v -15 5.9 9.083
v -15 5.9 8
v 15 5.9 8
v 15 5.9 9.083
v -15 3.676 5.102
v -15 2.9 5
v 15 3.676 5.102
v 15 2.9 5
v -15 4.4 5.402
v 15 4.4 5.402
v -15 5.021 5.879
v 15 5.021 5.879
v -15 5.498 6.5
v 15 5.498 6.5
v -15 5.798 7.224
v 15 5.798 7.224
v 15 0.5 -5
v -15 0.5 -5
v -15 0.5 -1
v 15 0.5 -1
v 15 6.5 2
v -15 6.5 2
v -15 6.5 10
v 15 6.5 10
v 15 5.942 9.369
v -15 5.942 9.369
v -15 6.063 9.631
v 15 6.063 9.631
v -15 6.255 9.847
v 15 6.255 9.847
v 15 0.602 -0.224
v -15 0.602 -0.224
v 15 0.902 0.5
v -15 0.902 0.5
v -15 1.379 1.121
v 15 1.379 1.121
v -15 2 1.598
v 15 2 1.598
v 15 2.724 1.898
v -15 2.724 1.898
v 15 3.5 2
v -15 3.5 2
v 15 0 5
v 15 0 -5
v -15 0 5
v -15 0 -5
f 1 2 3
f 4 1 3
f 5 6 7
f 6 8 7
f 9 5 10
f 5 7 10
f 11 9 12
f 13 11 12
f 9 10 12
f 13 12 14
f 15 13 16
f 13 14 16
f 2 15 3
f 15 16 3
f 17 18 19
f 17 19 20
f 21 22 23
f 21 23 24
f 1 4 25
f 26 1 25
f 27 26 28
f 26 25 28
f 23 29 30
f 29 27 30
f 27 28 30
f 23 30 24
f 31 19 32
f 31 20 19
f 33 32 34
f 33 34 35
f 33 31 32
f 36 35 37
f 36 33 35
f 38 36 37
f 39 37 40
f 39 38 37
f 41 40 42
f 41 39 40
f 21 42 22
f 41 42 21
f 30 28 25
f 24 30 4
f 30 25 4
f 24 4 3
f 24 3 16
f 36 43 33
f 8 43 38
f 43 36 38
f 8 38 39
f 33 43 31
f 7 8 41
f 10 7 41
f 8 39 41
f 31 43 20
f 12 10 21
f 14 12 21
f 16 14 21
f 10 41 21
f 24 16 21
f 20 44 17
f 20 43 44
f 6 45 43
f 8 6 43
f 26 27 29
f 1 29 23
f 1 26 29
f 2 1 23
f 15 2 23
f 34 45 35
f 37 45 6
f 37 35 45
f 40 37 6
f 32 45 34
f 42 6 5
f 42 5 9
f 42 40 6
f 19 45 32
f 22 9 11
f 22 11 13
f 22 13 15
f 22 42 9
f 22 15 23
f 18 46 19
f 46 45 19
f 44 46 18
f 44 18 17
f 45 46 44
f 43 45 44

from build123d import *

# Parameters (mm, degrees)
SKETCH1_W           = 30
SKETCH1_H           = 10
BOSS_EXTRUDE1_DEPTH = 0.5
SKETCH2_W           = 30
SKETCH2_H           = 3
BOSS_EXTRUDE2_DEPTH = 6
SKETCH3_W           = 30
SKETCH3_H           = 0.6
BOSS_EXTRUDE3_DEPTH = 5
FILLET1_R           = 3
FILLET2_R           = 1


with BuildPart() as part:
    # Sketch1 → Boss-Extrude1 (new body)
    with BuildSketch(Plane(origin=(0, 0, 0), x_dir=(1, 0, 0), z_dir=(0, 1, 0))):
        Rectangle(SKETCH1_W, SKETCH1_H)
    extrude(amount=BOSS_EXTRUDE1_DEPTH)

    # Sketch2 → Boss-Extrude2 (add)
    with BuildSketch(Plane(origin=(0, 0.5, 0), x_dir=(1, 0, 0), z_dir=(0, 1, 0))):
        with Locations((0, -3.5)):
            Rectangle(SKETCH2_W, SKETCH2_H)
    extrude(amount=BOSS_EXTRUDE2_DEPTH)

    # Sketch3 → Boss-Extrude3 (add)
    with BuildSketch(Plane.XY.offset(5)):
        with Locations((0, 6.2)):
            Rectangle(SKETCH3_W, SKETCH3_H)
    extrude(amount=BOSS_EXTRUDE3_DEPTH)

    # Fillet1
    fillet1_edges = [part.edges().sort_by_distance(p)[0] for p in [
        (0, 0.5, 2),
        (0, 5.9, 5),
    ]]
    fillet(fillet1_edges, radius=FILLET1_R)

    # Fillet2
    # the kernel refuses this fillet: 1 mm, written as the material it takes off along each edge
    with BuildSketch(Plane(origin=(17.291287847, 5.9, 10), x_dir=(0, 0, -1), z_dir=(-1, 0, 0))) as fillet2_piece_1:
        with BuildLine():
            CenterArc((0.916515139, -1), FILLET2_R, 90, 66.421821522)
            Line((0, -0.6), (-0.018330303, -0.592))
            ThreePointArc((-0.018330303, -0.592), (-0.02, -0.3), (-0.02, 0))
            Line((-0.02, 0), (0, 0.02))
            Line((0, 0.02), (0.916515139, 0.02))
            Line((0.916515139, 0.02), (0.916515139, 0))
        make_face()
    extrude(amount=34.582575695, mode=Mode.SUBTRACT)


solid = part.part
